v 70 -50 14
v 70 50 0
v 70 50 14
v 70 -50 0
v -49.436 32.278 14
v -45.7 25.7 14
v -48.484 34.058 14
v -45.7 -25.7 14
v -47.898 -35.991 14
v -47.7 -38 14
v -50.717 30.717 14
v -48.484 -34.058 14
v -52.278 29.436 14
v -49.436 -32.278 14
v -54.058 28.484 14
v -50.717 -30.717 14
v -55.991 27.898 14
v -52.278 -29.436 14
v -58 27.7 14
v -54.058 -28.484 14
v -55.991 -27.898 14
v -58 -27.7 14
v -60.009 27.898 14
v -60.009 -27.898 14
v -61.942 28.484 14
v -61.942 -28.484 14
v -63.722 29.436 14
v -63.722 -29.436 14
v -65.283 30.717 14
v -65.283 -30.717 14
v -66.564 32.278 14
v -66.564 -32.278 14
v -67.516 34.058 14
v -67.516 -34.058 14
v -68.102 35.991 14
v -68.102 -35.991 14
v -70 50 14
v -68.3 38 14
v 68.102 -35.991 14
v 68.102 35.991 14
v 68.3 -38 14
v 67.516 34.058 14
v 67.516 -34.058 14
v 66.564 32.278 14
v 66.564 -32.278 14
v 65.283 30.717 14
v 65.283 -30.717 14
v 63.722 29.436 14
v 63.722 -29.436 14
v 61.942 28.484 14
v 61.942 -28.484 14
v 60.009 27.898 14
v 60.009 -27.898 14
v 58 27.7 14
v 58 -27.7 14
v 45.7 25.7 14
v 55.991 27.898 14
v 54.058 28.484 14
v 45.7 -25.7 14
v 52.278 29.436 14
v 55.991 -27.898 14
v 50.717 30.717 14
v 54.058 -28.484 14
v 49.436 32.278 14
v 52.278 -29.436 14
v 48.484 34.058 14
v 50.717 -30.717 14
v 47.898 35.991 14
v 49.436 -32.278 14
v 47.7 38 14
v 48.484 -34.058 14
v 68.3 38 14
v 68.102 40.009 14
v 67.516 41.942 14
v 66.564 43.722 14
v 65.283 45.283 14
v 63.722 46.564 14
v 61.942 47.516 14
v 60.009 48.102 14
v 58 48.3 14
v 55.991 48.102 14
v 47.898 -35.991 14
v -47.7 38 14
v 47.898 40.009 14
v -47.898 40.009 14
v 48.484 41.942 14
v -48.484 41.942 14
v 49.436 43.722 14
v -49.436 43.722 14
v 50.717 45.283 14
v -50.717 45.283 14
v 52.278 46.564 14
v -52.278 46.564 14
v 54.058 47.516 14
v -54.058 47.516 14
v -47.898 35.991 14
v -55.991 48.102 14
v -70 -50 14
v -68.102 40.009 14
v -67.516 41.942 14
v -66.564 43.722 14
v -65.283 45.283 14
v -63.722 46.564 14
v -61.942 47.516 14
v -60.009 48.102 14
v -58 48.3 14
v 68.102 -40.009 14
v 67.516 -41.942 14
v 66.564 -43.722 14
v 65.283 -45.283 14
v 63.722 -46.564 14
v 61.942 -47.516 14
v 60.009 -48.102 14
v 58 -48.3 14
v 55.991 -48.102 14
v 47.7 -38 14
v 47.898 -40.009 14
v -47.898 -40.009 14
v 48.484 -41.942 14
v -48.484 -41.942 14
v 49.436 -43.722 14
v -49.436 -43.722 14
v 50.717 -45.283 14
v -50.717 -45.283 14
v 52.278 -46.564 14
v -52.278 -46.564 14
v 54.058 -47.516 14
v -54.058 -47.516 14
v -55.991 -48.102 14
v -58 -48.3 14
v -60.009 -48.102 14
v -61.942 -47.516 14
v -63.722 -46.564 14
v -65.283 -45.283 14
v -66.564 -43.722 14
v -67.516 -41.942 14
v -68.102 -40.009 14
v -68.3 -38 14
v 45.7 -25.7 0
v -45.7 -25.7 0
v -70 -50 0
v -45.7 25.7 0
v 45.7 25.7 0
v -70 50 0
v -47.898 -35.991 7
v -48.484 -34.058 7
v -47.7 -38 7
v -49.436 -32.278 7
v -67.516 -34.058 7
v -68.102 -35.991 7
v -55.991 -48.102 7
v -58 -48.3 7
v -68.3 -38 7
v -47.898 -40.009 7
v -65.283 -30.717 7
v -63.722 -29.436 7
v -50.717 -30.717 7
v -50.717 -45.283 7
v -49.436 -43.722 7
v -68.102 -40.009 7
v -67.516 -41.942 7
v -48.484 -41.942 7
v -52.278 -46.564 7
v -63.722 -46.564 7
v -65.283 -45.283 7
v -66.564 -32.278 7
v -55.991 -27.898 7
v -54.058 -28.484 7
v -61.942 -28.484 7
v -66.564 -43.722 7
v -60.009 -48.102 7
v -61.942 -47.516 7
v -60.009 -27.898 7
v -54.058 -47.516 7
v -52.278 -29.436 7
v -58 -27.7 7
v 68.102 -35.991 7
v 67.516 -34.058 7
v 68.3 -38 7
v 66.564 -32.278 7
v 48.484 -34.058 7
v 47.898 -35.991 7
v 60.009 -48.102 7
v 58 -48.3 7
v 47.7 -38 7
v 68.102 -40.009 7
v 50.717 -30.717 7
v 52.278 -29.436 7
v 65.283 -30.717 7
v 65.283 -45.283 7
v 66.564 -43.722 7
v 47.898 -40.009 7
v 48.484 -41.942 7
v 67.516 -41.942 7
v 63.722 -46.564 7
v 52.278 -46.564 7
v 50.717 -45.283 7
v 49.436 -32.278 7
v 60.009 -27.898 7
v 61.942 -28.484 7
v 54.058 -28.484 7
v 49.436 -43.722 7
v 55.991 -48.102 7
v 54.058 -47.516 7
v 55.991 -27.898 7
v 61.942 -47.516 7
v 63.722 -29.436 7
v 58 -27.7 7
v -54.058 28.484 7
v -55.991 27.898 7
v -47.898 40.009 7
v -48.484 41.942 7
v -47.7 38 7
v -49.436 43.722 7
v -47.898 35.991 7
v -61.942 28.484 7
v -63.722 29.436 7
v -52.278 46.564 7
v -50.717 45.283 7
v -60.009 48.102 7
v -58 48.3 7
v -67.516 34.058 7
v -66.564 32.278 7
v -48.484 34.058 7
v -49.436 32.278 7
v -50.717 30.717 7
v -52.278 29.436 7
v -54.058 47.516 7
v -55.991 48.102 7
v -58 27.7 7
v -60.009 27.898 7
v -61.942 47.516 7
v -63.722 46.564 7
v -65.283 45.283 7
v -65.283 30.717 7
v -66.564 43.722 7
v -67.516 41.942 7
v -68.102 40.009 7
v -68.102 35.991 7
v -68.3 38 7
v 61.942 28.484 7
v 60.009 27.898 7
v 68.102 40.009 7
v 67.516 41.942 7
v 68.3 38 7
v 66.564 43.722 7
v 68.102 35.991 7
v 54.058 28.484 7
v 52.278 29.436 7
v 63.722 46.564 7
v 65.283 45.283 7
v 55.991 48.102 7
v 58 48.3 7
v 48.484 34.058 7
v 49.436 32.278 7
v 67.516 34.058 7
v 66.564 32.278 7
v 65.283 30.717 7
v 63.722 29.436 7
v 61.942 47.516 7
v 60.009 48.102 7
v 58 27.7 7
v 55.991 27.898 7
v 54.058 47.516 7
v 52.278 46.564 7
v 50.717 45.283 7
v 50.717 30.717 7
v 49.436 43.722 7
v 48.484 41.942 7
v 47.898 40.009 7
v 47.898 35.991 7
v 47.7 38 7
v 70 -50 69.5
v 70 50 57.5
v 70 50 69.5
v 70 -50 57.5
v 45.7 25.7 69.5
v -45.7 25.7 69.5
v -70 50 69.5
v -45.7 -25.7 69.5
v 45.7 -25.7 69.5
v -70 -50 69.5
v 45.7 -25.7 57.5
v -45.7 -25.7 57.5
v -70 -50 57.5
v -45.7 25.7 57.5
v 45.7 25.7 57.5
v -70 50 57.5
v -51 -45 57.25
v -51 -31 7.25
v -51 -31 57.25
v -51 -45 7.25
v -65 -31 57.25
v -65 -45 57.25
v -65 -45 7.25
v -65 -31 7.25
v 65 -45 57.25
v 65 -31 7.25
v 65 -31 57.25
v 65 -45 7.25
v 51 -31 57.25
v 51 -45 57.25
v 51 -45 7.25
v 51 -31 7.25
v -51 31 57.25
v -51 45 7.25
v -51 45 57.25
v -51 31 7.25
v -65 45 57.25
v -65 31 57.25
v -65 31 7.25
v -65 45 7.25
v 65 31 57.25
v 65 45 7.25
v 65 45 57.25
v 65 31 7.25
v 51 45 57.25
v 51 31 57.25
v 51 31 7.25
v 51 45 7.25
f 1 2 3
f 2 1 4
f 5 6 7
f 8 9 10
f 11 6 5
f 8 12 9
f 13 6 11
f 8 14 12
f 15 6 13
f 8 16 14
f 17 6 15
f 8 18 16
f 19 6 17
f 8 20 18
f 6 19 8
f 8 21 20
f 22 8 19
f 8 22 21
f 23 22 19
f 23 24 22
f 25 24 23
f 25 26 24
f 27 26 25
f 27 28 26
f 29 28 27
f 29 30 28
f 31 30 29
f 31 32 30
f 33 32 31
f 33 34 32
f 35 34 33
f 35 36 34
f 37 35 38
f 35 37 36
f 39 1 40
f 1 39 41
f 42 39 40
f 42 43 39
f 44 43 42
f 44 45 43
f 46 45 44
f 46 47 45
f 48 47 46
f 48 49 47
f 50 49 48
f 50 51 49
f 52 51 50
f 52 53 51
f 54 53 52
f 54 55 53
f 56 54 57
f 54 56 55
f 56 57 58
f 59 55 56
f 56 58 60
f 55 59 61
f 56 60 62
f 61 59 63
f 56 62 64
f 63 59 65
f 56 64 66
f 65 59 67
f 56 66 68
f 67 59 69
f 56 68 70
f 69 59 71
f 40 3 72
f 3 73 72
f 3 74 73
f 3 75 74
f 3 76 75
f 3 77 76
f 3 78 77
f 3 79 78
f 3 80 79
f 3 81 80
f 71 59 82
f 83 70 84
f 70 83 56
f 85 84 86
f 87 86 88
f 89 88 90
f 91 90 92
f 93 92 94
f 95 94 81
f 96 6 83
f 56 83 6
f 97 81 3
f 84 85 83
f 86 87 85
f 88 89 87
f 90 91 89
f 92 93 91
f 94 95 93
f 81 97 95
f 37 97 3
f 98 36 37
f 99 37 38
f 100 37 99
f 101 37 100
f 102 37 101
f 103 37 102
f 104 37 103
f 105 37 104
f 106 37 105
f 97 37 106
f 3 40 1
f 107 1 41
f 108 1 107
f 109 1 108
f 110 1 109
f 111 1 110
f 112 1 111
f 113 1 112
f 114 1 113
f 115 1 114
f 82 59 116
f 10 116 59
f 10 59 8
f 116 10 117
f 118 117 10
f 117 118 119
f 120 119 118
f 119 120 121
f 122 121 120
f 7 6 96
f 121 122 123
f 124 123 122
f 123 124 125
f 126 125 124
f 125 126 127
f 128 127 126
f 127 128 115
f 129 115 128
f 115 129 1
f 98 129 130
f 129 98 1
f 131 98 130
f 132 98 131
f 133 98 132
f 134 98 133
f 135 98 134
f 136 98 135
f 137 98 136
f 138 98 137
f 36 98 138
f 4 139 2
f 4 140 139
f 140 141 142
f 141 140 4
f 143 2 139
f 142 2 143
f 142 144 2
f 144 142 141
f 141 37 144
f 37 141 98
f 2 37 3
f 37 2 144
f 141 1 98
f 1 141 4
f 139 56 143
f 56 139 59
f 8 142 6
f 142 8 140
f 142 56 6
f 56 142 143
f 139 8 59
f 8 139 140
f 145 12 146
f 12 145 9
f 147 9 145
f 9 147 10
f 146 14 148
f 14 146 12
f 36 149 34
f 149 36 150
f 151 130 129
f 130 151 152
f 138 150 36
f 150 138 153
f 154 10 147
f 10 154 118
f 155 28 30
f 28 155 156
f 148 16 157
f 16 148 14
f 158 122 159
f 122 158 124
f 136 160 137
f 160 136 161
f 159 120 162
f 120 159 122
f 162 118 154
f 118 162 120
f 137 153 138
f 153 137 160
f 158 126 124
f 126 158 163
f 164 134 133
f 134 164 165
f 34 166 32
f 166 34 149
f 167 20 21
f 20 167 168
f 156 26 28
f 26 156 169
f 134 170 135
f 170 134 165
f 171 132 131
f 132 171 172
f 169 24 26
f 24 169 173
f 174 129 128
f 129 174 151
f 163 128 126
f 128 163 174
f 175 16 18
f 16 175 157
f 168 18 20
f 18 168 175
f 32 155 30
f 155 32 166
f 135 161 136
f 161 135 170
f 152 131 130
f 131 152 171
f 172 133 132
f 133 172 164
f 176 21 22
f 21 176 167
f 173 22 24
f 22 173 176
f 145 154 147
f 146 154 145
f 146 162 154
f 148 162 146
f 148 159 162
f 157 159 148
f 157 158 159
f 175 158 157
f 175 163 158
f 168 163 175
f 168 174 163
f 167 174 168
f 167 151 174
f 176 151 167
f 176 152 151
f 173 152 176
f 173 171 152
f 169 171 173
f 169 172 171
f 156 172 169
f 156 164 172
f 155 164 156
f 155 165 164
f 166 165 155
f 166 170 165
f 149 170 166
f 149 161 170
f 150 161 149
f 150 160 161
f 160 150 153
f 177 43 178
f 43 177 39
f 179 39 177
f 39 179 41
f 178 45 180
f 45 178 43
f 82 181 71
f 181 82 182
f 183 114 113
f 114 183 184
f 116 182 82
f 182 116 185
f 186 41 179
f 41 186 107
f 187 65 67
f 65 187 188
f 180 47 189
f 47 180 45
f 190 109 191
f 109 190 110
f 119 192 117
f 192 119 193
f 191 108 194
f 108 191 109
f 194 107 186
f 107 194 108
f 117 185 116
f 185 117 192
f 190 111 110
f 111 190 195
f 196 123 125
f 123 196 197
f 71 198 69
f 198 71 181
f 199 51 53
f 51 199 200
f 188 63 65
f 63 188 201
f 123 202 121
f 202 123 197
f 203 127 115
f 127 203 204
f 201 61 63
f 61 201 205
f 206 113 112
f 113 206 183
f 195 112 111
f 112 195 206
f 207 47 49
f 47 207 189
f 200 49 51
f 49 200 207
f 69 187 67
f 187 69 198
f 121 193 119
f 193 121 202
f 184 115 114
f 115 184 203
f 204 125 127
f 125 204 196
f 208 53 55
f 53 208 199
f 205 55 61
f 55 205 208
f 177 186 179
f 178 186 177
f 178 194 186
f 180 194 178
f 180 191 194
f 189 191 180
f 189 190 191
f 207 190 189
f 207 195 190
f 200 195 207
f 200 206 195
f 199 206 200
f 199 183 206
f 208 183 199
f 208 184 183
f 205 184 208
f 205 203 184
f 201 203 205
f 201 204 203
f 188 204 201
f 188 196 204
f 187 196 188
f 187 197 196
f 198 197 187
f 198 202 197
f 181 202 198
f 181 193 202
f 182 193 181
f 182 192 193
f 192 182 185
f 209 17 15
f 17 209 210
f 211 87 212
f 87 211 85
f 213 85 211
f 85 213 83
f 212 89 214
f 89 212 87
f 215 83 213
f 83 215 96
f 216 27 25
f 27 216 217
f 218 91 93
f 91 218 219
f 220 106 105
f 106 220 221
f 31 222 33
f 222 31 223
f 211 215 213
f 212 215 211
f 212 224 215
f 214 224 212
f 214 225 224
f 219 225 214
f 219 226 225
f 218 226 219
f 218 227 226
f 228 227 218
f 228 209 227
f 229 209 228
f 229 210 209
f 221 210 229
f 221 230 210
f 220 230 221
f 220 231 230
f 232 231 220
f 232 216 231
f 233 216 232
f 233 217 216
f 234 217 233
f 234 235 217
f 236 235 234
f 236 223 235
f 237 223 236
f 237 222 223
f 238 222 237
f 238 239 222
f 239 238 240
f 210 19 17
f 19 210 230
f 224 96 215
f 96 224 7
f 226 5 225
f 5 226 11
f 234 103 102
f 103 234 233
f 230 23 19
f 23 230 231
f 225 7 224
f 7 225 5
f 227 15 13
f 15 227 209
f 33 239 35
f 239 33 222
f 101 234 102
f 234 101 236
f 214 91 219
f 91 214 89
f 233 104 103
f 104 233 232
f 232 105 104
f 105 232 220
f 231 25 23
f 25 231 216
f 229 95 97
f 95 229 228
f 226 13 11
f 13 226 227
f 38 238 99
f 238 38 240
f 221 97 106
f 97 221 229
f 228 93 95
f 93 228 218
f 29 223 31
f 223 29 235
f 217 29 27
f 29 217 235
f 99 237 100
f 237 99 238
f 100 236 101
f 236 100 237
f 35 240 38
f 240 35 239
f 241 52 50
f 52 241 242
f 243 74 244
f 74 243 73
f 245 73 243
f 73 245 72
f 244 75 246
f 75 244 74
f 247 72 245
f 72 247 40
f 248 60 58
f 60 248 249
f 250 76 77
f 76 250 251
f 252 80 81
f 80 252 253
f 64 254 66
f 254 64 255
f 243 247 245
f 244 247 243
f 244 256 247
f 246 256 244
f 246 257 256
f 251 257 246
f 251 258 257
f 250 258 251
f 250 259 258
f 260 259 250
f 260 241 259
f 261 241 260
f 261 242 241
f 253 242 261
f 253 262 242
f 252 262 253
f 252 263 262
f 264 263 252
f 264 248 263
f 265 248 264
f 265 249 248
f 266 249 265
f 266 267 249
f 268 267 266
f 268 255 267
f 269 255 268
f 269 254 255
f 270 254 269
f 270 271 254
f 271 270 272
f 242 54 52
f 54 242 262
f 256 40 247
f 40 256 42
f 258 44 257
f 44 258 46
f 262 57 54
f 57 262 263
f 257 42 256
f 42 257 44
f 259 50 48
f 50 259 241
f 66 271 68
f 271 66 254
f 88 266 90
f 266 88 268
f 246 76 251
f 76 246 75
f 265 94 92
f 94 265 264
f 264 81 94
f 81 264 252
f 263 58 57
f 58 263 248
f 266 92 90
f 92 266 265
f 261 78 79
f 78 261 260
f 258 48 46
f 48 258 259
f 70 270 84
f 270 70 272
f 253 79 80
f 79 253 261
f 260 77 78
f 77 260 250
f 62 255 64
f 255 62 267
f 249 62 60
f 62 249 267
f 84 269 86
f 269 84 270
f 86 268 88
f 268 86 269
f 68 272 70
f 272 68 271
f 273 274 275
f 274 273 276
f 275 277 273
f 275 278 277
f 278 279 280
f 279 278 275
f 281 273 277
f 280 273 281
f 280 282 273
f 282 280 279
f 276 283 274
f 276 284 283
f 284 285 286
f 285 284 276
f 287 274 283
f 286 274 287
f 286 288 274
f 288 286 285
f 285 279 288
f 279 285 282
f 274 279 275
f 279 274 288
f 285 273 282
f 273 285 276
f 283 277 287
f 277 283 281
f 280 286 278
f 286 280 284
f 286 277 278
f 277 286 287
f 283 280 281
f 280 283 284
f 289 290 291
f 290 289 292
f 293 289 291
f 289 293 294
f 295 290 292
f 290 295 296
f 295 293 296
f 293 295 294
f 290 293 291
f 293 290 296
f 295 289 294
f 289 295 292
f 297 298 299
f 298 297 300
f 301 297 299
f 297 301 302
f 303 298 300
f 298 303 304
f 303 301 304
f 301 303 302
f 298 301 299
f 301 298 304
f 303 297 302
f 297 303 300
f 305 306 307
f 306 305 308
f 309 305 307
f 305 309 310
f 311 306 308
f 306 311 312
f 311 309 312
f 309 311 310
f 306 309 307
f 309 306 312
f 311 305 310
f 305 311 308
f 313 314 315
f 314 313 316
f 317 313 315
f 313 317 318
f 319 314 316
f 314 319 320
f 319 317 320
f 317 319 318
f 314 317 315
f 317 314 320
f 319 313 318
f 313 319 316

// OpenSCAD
$fn = 32;

// ------------------------------------------------------------------------
// Frame cube: base 140 x 100 mm, posts 50 mm tall
// Every part is its own module, assembly() places every instance.
// ------------------------------------------------------------------------

// --- part 1 ---
module base_frame() {
  difference() {
    translate([-70, -50, 0]) cube([140, 100, 14]);
    translate([-45.7, -25.7, -1]) cube([91.4, 51.4, 16]);
    translate([-58, -38, 7]) cylinder(h = 8, d = 20.6);
    translate([58, -38, 7]) cylinder(h = 8, d = 20.6);
    translate([-58, 38, 7]) cylinder(h = 8, d = 20.6);
    translate([58, 38, 7]) cylinder(h = 8, d = 20.6);
  }
}

// --- part 2 ---
module corner_post() {
  translate([-7, -7, 0]) cube([14, 14, 50]);
}

// --- part 3 ---
module top_frame() {
  difference() {
    translate([-70, -50, 0]) cube([140, 100, 12]);
    translate([-45.7, -25.7, -1]) cube([91.4, 51.4, 14]);
  }
}

// --- assembly ---
module assembly() {
  color([0.80, 0.24, 0.20]) translate([0, 0, 0]) rotate([0, 0, 0]) base_frame();
  color([0.20, 0.45, 0.75]) translate([-58, -38, 7.25]) rotate([0, 0, 0]) corner_post();
  color([0.25, 0.62, 0.32]) translate([58, -38, 7.25]) rotate([0, 0, 0]) corner_post();
  color([0.92, 0.70, 0.18]) translate([-58, 38, 7.25]) rotate([0, 0, 0]) corner_post();
  color([0.58, 0.35, 0.70]) translate([58, 38, 7.25]) rotate([0, 0, 0]) corner_post();
  color([0.16, 0.66, 0.66]) translate([0, 0, 57.5]) rotate([0, 0, 0]) top_frame();
}

assembly();
